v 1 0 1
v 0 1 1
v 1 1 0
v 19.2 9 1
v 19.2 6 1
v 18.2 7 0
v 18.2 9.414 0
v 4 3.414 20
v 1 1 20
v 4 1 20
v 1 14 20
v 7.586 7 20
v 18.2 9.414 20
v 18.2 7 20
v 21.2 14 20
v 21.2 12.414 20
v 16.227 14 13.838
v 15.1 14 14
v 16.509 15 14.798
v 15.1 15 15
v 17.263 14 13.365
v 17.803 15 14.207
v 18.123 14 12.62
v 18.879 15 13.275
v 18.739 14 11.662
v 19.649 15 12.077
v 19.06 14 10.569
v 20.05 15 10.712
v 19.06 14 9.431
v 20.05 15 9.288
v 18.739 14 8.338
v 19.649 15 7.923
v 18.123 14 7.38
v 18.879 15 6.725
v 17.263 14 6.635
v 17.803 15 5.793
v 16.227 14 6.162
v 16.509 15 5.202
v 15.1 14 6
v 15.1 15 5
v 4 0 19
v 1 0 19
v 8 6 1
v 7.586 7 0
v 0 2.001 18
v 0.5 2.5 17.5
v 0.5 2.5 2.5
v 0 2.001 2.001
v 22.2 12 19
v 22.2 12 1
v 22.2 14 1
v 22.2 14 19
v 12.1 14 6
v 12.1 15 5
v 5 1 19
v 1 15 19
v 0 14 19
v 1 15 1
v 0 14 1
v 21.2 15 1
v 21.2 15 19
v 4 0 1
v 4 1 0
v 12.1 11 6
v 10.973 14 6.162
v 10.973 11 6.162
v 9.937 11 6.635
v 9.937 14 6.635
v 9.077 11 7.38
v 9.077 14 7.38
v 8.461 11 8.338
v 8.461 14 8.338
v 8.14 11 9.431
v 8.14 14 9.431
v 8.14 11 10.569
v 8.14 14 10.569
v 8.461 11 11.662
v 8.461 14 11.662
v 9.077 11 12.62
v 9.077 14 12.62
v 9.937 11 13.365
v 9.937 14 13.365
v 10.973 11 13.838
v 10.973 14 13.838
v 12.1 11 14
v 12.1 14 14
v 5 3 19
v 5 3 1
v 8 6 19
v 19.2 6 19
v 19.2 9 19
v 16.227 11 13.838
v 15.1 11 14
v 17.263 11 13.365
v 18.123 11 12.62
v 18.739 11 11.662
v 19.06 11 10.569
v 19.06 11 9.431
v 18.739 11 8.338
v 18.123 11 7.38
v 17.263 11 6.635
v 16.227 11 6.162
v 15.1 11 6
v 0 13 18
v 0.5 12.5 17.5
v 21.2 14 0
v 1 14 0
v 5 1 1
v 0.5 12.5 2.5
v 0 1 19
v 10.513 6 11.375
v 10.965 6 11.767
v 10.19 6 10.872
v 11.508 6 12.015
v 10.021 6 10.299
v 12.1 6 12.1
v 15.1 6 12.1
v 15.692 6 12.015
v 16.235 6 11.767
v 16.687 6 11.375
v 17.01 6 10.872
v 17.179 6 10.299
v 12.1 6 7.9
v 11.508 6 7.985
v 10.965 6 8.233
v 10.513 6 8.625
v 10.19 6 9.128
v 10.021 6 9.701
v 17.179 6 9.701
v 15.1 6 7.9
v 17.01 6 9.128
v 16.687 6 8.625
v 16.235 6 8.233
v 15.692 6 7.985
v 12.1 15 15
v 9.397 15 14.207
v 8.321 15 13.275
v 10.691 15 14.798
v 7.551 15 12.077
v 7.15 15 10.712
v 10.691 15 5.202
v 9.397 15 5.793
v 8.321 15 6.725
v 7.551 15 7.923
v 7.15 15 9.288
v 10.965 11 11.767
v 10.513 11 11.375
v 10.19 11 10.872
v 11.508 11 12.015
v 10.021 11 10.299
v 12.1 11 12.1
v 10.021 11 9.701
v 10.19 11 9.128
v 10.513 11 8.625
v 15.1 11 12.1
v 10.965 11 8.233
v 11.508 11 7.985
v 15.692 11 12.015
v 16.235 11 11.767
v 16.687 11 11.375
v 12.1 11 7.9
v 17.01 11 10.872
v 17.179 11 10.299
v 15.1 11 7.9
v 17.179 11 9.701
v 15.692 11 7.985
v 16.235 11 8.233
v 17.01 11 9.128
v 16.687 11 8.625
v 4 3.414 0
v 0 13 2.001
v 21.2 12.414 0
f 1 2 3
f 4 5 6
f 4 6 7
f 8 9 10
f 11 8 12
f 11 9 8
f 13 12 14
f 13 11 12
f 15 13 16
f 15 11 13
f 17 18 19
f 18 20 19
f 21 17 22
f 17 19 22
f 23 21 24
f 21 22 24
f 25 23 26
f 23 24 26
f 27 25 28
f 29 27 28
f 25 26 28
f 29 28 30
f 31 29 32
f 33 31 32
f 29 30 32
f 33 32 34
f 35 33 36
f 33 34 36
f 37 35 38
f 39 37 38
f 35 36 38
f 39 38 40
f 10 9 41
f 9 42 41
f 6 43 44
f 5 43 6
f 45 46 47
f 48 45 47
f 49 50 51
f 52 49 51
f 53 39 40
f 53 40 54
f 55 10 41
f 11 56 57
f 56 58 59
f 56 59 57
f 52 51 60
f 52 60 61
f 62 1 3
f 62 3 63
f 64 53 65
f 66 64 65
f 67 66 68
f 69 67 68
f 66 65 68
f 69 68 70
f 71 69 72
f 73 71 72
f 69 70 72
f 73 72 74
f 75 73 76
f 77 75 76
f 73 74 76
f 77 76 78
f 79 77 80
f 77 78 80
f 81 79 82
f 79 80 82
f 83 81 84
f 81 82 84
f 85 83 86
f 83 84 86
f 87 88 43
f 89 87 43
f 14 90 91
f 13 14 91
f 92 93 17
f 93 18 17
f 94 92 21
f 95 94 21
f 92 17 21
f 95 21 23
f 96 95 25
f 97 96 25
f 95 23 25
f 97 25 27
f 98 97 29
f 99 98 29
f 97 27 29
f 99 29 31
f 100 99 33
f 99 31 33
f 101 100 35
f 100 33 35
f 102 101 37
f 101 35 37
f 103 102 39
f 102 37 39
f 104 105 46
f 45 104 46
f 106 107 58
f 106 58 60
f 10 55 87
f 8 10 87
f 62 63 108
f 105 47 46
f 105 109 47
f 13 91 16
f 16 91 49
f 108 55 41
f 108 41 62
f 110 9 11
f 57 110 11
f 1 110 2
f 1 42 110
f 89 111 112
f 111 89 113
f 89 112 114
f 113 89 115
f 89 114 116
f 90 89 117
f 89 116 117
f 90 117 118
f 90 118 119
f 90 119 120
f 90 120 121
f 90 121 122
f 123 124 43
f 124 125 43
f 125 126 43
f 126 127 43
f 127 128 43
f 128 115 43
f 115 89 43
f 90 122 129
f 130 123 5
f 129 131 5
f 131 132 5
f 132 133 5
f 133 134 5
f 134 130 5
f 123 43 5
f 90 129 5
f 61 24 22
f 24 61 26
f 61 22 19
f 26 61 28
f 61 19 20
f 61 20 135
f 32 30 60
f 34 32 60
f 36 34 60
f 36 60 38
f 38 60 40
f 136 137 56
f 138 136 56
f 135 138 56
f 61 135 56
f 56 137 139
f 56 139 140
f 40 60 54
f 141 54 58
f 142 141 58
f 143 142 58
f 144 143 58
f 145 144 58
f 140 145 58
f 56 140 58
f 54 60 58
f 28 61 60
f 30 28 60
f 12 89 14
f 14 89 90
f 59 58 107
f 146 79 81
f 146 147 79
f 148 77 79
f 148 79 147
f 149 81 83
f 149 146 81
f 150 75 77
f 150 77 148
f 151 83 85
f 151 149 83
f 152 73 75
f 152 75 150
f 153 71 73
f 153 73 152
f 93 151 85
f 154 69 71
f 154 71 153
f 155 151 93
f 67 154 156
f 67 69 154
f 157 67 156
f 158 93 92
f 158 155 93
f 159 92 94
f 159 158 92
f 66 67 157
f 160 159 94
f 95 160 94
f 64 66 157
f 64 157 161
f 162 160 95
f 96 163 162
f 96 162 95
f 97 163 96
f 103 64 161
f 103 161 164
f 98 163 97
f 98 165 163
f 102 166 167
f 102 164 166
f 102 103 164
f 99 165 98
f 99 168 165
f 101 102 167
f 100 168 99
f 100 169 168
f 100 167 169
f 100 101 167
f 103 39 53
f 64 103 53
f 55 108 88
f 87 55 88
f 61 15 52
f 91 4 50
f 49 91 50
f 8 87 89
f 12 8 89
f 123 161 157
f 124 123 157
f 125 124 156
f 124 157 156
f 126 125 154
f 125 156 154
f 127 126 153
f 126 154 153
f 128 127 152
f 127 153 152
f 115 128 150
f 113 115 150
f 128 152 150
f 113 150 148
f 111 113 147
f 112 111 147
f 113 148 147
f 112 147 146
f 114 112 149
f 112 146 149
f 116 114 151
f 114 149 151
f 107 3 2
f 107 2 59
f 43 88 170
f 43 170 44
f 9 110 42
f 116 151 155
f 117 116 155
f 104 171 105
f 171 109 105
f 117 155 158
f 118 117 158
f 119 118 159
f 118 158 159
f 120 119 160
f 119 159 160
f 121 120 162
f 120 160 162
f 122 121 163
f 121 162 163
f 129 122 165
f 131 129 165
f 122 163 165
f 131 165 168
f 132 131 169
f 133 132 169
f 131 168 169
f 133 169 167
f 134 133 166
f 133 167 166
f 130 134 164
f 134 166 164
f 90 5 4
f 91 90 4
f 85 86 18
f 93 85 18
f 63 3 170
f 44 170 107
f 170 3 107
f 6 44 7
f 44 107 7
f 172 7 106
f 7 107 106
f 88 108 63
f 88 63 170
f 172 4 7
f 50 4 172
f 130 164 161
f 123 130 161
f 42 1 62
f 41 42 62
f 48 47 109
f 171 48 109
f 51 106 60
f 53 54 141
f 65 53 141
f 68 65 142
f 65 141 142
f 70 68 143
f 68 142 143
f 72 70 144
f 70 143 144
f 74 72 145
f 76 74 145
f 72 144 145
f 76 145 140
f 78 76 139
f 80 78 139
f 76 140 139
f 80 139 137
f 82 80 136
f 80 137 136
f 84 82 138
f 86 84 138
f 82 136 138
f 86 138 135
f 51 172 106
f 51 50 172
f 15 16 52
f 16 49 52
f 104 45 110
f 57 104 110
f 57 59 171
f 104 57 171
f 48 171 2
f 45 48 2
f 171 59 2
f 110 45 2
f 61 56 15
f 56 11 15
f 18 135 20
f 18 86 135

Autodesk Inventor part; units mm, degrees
ref_plane "YZ Plane" through (0, 0, 0) normal (1, 0, 0) x (0, 1, 0)
ref_plane "XZ Plane" through (0, 0, 0) normal (0, 1, 0) x (-1, 0, 0)
ref_plane "XY Plane" through (0, 0, 0) normal (0, 0, 1) x (1, 0, 0)
sketch "Base Sketch" plane through (0, 0, 0) normal (0, 0, 1) x (1, 0, 0)
  line L0 (0, 0) -> (5, 0)
  line L1 (5, 0) -> (5, 3)
  line L2 (5, 3) -> (8, 6)
  line L3 (8, 6) -> (19.2, 6)
  line L4 (22.2, 15) -> (0, 15)
  line L5 (0, 15) -> (0, 0)
  line L6 (19.2, 6) -> (19.2, 9)
  line L7 (19.2, 9) -> (22.2, 12)
  line L8 (22.2, 12) -> (22.2, 15)
  dimension "d0" = 45
  dimension "d2" = 5
  dimension "d4" = 11.2
  dimension "d7" = 3
  dimension "d32" = 3
  dimension "d45" = 3
  dimension "d47" = 3
extrude "Profile" add sketch "Base Sketch" along normal blind 20
sketch "CB Slot Sketch" plane through (0, 15, 0) normal (0, 1, 0) x (1, 0, 0)
  line L0 (10, -10) -> (17.2, -10) construction
  line L1 (12.1, -12.1) -> (15.1, -12.1)
  line L2 (15.1, -7.9) -> (12.1, -7.9)
  arc A0 (12.1, -7.9) -> (12.1, -12.1) centre (12.1, -10) ccw
  arc A1 (15.1, -12.1) -> (15.1, -7.9) centre (15.1, -10) ccw
  line L3 (12.1, -10) -> (15.1, -10) construction
  line L4 (12.1, -14.0005) -> (15.1, -14.0005)
  line L5 (15.1, -5.9995) -> (12.1, -5.9995)
  arc A2 (12.1, -5.9995) -> (12.1, -14.0005) centre (12.1, -10) ccw
  arc A3 (15.1, -14.0005) -> (15.1, -5.9995) centre (15.1, -10) ccw
  line L6 (8, 0) -> (19.2, 0) construction
  line L7 (19.2, 0) -> (19.2, -20) construction
  line L8 (8, -20) -> (19.2, -20) construction
  line L9 (8, 0) -> (8, -20) construction
  point P0 (13.6, -10)
  point P1 (10, -10)
  point P2 (8.0995, -10)
  point P3 (13.6, -20)
  point P4 (8, -10)
  dimension "d11" = 4.2
  dimension "d16" = 8.001
  dimension "d24" = 3
extrude "M4 Slot" cut sketch "CB Slot Sketch" against normal through all contours A0 L2 A1 L1
extrude "M4 CB Slot" cut sketch "CB Slot Sketch" against normal blind 4 contours A0 L2 A1 L1 | A2 L5 A3 L4
sketch "Inset Pattern" plane through (0, 0, 0) normal (-1, 0, 0) x (0, 0, 1)
  line L0 (0, 15) -> (0, 0) construction
  line L1 (0, 0) -> (20, 0) construction
  line L2 (20, 15) -> (20, 0) construction
  line L3 (0, 15) -> (20, 15) construction
  line L4 (2.5, 12.5) -> (17.5, 12.5)
  line L5 (17.5, 12.5) -> (17.5, 2.5)
  line L6 (17.5, 2.5) -> (2.5, 2.5)
  line L7 (2.5, 2.5) -> (2.5, 12.5)
  point P0 (17.5, 7.5)
  point P1 (20, 7.5)
  point P2 (10, 12.5)
  point P3 (10, 15)
  dimension "d48" = 15
  dimension "d49" = 10
extrude "Inset" cut sketch "Inset Pattern" against normal blind 0.5
chamfer "Inset Chamfer" distance 0.5 angle 45 4 edges at (0, 12.5, 10) (0, 7.5, 17.5) (0, 7.5, 2.5) (0, 2.5, 10)
chamfer "Edgebreak" distance 1 angle 45 26 edges at (11.1, 15, 20) (11.1, 15, 0) (0, 15, 10) (0, 7.5, 20) (0, 7.5, 0) (0, 0, 10) (2.5, 0, 20) (2.5, 0, 0) (20.7, 10.5, 20) (19.2, 7.5, 20) (13.6, 6, 20) (6.5, 4.5, 20) (5, 1.5, 20) (5, 1.5, 0) (6.5, 4.5, 0) (13.6, 6, 0) (19.2, 7.5, 0) (20.7, 10.5, 0) (19.1005, 15, 10) (13.6, 15, 14.0005) (8.0995, 15, 10) (13.6, 15, 5.9995) (22.2, 13.5, 20) (22.2, 13.5, 0) (22.2, 15, 10) (5, 0, 10)
equation "\"d7\" = d6"
equation "\"d24\" = jawTravel"
equation "\"jawTravel\" = 3"
equation "\"slotLength\" = M4_clearance_hole + jawTravel"
equation "\"M4_clearance_hole\" = 4.2"
equation "\"chamferSize\" = 1"
equation "\"jawThickness\" = 5"
equation "\"topThickness\" = 3"
equation "\"d6\" = 3"
properties part number "Moving Jaw (M4) Normal" material "ABS Plastic"
